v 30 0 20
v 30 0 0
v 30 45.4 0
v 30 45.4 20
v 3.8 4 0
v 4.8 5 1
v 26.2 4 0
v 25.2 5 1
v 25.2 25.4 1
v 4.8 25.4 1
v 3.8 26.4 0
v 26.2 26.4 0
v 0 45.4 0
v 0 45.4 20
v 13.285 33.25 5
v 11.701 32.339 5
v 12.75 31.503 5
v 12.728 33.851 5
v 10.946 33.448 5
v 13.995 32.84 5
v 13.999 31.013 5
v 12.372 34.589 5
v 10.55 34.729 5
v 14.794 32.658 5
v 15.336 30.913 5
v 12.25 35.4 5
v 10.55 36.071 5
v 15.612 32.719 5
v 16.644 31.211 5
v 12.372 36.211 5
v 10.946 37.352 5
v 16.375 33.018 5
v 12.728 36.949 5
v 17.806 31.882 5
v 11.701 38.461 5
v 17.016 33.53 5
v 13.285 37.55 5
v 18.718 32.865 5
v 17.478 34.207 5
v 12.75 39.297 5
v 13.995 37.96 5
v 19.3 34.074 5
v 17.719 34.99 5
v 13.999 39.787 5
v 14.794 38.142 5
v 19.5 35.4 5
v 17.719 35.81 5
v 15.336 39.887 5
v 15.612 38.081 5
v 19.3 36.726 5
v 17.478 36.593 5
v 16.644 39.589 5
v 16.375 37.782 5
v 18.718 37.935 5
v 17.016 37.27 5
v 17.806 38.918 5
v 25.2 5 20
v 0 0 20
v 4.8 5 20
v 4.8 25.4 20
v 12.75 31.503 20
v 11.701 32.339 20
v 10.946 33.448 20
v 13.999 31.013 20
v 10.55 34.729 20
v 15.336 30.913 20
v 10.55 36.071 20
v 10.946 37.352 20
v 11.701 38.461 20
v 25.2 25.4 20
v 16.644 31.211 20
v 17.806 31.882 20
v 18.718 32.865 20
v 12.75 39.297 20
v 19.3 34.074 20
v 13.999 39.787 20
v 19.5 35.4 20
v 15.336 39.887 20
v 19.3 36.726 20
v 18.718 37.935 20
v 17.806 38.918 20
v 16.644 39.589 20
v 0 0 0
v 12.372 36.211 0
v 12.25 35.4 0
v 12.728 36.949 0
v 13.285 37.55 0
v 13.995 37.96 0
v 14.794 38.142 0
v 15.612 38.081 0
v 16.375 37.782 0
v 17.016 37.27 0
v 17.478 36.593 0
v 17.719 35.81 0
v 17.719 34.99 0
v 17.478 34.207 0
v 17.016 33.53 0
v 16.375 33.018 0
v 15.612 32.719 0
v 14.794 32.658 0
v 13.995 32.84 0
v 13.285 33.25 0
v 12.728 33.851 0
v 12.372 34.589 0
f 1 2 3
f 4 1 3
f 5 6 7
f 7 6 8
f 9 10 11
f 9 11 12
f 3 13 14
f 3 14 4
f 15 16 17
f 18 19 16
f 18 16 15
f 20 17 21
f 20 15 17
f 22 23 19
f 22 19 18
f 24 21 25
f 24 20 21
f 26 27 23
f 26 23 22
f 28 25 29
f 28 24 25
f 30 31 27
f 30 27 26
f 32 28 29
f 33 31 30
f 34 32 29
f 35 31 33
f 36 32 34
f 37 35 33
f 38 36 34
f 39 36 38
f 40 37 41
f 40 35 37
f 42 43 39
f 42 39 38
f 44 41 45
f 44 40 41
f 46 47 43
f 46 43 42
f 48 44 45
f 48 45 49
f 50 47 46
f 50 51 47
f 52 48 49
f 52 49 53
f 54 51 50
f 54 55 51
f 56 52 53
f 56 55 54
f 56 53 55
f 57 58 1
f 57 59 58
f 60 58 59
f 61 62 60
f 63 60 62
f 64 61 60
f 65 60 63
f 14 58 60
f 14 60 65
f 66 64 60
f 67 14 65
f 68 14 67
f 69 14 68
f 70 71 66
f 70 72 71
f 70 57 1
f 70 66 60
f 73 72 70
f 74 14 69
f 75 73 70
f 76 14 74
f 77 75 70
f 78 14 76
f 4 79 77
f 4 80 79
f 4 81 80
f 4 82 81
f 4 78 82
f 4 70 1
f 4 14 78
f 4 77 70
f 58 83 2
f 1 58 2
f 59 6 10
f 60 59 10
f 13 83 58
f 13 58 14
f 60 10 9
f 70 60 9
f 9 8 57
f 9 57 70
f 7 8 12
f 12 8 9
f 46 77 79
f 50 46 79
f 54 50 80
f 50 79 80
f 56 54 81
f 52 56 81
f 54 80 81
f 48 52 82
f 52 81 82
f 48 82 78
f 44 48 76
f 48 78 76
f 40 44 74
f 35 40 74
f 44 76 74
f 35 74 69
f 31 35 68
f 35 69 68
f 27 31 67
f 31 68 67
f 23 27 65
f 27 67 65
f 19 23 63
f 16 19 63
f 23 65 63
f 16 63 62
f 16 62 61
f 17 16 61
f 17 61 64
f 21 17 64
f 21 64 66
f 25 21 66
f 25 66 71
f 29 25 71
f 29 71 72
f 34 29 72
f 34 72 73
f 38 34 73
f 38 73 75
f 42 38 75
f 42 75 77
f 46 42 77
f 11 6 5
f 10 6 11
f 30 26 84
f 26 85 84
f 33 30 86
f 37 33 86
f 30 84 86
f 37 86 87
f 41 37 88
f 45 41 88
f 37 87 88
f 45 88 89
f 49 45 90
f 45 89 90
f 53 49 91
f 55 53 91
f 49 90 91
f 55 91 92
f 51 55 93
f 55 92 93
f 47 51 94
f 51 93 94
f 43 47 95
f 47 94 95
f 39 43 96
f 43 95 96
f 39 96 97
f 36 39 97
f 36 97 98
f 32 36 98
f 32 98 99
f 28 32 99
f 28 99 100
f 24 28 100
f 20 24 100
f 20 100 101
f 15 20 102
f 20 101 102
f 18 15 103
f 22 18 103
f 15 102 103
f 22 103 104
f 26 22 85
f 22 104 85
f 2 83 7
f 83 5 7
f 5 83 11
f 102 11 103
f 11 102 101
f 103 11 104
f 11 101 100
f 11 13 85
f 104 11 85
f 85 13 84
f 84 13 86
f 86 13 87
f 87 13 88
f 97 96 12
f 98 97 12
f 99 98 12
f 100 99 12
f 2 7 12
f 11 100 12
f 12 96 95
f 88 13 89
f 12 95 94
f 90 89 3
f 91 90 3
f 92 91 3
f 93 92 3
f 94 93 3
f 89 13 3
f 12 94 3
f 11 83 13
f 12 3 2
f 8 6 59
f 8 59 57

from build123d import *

# Parameters (mm, degrees)
SKETCH_W         = 30
SKETCH_H         = 45.4
SKETCH_W_2       = 20.4
SKETCH_H_2       = 20.4
PAD_DEPTH        = 20
HOLE_D           = 5.5
HOLE_CBORE_D     = 9
HOLE_CBORE_DEPTH = 15
CHAMFER_SIZE     = 1


with BuildPart() as part:
    # Sketch → Pad (new body)
    with BuildSketch(Plane.XY):
        with Locations((15, 22.7)):
            Rectangle(SKETCH_W, SKETCH_H)
        with Locations((15, 15.2)):
            Rectangle(SKETCH_W_2, SKETCH_H_2, mode=Mode.SUBTRACT)
    extrude(amount=PAD_DEPTH)

    # Hole (through all)
    with Locations(Plane.XY.offset(20)):
        with Locations((15, 35.4)):
            CounterBoreHole(HOLE_D / 2, HOLE_CBORE_D / 2, HOLE_CBORE_DEPTH)

    # Chamfer
    chamfer_edges = [part.edges().sort_by_distance(p)[0] for p in [
        (15, 25.4, 0),
        (25.2, 15.2, 0),
        (4.8, 15.2, 0),
        (15, 5, 0),
    ]]
    chamfer(chamfer_edges, length=CHAMFER_SIZE)


solid = part.part
